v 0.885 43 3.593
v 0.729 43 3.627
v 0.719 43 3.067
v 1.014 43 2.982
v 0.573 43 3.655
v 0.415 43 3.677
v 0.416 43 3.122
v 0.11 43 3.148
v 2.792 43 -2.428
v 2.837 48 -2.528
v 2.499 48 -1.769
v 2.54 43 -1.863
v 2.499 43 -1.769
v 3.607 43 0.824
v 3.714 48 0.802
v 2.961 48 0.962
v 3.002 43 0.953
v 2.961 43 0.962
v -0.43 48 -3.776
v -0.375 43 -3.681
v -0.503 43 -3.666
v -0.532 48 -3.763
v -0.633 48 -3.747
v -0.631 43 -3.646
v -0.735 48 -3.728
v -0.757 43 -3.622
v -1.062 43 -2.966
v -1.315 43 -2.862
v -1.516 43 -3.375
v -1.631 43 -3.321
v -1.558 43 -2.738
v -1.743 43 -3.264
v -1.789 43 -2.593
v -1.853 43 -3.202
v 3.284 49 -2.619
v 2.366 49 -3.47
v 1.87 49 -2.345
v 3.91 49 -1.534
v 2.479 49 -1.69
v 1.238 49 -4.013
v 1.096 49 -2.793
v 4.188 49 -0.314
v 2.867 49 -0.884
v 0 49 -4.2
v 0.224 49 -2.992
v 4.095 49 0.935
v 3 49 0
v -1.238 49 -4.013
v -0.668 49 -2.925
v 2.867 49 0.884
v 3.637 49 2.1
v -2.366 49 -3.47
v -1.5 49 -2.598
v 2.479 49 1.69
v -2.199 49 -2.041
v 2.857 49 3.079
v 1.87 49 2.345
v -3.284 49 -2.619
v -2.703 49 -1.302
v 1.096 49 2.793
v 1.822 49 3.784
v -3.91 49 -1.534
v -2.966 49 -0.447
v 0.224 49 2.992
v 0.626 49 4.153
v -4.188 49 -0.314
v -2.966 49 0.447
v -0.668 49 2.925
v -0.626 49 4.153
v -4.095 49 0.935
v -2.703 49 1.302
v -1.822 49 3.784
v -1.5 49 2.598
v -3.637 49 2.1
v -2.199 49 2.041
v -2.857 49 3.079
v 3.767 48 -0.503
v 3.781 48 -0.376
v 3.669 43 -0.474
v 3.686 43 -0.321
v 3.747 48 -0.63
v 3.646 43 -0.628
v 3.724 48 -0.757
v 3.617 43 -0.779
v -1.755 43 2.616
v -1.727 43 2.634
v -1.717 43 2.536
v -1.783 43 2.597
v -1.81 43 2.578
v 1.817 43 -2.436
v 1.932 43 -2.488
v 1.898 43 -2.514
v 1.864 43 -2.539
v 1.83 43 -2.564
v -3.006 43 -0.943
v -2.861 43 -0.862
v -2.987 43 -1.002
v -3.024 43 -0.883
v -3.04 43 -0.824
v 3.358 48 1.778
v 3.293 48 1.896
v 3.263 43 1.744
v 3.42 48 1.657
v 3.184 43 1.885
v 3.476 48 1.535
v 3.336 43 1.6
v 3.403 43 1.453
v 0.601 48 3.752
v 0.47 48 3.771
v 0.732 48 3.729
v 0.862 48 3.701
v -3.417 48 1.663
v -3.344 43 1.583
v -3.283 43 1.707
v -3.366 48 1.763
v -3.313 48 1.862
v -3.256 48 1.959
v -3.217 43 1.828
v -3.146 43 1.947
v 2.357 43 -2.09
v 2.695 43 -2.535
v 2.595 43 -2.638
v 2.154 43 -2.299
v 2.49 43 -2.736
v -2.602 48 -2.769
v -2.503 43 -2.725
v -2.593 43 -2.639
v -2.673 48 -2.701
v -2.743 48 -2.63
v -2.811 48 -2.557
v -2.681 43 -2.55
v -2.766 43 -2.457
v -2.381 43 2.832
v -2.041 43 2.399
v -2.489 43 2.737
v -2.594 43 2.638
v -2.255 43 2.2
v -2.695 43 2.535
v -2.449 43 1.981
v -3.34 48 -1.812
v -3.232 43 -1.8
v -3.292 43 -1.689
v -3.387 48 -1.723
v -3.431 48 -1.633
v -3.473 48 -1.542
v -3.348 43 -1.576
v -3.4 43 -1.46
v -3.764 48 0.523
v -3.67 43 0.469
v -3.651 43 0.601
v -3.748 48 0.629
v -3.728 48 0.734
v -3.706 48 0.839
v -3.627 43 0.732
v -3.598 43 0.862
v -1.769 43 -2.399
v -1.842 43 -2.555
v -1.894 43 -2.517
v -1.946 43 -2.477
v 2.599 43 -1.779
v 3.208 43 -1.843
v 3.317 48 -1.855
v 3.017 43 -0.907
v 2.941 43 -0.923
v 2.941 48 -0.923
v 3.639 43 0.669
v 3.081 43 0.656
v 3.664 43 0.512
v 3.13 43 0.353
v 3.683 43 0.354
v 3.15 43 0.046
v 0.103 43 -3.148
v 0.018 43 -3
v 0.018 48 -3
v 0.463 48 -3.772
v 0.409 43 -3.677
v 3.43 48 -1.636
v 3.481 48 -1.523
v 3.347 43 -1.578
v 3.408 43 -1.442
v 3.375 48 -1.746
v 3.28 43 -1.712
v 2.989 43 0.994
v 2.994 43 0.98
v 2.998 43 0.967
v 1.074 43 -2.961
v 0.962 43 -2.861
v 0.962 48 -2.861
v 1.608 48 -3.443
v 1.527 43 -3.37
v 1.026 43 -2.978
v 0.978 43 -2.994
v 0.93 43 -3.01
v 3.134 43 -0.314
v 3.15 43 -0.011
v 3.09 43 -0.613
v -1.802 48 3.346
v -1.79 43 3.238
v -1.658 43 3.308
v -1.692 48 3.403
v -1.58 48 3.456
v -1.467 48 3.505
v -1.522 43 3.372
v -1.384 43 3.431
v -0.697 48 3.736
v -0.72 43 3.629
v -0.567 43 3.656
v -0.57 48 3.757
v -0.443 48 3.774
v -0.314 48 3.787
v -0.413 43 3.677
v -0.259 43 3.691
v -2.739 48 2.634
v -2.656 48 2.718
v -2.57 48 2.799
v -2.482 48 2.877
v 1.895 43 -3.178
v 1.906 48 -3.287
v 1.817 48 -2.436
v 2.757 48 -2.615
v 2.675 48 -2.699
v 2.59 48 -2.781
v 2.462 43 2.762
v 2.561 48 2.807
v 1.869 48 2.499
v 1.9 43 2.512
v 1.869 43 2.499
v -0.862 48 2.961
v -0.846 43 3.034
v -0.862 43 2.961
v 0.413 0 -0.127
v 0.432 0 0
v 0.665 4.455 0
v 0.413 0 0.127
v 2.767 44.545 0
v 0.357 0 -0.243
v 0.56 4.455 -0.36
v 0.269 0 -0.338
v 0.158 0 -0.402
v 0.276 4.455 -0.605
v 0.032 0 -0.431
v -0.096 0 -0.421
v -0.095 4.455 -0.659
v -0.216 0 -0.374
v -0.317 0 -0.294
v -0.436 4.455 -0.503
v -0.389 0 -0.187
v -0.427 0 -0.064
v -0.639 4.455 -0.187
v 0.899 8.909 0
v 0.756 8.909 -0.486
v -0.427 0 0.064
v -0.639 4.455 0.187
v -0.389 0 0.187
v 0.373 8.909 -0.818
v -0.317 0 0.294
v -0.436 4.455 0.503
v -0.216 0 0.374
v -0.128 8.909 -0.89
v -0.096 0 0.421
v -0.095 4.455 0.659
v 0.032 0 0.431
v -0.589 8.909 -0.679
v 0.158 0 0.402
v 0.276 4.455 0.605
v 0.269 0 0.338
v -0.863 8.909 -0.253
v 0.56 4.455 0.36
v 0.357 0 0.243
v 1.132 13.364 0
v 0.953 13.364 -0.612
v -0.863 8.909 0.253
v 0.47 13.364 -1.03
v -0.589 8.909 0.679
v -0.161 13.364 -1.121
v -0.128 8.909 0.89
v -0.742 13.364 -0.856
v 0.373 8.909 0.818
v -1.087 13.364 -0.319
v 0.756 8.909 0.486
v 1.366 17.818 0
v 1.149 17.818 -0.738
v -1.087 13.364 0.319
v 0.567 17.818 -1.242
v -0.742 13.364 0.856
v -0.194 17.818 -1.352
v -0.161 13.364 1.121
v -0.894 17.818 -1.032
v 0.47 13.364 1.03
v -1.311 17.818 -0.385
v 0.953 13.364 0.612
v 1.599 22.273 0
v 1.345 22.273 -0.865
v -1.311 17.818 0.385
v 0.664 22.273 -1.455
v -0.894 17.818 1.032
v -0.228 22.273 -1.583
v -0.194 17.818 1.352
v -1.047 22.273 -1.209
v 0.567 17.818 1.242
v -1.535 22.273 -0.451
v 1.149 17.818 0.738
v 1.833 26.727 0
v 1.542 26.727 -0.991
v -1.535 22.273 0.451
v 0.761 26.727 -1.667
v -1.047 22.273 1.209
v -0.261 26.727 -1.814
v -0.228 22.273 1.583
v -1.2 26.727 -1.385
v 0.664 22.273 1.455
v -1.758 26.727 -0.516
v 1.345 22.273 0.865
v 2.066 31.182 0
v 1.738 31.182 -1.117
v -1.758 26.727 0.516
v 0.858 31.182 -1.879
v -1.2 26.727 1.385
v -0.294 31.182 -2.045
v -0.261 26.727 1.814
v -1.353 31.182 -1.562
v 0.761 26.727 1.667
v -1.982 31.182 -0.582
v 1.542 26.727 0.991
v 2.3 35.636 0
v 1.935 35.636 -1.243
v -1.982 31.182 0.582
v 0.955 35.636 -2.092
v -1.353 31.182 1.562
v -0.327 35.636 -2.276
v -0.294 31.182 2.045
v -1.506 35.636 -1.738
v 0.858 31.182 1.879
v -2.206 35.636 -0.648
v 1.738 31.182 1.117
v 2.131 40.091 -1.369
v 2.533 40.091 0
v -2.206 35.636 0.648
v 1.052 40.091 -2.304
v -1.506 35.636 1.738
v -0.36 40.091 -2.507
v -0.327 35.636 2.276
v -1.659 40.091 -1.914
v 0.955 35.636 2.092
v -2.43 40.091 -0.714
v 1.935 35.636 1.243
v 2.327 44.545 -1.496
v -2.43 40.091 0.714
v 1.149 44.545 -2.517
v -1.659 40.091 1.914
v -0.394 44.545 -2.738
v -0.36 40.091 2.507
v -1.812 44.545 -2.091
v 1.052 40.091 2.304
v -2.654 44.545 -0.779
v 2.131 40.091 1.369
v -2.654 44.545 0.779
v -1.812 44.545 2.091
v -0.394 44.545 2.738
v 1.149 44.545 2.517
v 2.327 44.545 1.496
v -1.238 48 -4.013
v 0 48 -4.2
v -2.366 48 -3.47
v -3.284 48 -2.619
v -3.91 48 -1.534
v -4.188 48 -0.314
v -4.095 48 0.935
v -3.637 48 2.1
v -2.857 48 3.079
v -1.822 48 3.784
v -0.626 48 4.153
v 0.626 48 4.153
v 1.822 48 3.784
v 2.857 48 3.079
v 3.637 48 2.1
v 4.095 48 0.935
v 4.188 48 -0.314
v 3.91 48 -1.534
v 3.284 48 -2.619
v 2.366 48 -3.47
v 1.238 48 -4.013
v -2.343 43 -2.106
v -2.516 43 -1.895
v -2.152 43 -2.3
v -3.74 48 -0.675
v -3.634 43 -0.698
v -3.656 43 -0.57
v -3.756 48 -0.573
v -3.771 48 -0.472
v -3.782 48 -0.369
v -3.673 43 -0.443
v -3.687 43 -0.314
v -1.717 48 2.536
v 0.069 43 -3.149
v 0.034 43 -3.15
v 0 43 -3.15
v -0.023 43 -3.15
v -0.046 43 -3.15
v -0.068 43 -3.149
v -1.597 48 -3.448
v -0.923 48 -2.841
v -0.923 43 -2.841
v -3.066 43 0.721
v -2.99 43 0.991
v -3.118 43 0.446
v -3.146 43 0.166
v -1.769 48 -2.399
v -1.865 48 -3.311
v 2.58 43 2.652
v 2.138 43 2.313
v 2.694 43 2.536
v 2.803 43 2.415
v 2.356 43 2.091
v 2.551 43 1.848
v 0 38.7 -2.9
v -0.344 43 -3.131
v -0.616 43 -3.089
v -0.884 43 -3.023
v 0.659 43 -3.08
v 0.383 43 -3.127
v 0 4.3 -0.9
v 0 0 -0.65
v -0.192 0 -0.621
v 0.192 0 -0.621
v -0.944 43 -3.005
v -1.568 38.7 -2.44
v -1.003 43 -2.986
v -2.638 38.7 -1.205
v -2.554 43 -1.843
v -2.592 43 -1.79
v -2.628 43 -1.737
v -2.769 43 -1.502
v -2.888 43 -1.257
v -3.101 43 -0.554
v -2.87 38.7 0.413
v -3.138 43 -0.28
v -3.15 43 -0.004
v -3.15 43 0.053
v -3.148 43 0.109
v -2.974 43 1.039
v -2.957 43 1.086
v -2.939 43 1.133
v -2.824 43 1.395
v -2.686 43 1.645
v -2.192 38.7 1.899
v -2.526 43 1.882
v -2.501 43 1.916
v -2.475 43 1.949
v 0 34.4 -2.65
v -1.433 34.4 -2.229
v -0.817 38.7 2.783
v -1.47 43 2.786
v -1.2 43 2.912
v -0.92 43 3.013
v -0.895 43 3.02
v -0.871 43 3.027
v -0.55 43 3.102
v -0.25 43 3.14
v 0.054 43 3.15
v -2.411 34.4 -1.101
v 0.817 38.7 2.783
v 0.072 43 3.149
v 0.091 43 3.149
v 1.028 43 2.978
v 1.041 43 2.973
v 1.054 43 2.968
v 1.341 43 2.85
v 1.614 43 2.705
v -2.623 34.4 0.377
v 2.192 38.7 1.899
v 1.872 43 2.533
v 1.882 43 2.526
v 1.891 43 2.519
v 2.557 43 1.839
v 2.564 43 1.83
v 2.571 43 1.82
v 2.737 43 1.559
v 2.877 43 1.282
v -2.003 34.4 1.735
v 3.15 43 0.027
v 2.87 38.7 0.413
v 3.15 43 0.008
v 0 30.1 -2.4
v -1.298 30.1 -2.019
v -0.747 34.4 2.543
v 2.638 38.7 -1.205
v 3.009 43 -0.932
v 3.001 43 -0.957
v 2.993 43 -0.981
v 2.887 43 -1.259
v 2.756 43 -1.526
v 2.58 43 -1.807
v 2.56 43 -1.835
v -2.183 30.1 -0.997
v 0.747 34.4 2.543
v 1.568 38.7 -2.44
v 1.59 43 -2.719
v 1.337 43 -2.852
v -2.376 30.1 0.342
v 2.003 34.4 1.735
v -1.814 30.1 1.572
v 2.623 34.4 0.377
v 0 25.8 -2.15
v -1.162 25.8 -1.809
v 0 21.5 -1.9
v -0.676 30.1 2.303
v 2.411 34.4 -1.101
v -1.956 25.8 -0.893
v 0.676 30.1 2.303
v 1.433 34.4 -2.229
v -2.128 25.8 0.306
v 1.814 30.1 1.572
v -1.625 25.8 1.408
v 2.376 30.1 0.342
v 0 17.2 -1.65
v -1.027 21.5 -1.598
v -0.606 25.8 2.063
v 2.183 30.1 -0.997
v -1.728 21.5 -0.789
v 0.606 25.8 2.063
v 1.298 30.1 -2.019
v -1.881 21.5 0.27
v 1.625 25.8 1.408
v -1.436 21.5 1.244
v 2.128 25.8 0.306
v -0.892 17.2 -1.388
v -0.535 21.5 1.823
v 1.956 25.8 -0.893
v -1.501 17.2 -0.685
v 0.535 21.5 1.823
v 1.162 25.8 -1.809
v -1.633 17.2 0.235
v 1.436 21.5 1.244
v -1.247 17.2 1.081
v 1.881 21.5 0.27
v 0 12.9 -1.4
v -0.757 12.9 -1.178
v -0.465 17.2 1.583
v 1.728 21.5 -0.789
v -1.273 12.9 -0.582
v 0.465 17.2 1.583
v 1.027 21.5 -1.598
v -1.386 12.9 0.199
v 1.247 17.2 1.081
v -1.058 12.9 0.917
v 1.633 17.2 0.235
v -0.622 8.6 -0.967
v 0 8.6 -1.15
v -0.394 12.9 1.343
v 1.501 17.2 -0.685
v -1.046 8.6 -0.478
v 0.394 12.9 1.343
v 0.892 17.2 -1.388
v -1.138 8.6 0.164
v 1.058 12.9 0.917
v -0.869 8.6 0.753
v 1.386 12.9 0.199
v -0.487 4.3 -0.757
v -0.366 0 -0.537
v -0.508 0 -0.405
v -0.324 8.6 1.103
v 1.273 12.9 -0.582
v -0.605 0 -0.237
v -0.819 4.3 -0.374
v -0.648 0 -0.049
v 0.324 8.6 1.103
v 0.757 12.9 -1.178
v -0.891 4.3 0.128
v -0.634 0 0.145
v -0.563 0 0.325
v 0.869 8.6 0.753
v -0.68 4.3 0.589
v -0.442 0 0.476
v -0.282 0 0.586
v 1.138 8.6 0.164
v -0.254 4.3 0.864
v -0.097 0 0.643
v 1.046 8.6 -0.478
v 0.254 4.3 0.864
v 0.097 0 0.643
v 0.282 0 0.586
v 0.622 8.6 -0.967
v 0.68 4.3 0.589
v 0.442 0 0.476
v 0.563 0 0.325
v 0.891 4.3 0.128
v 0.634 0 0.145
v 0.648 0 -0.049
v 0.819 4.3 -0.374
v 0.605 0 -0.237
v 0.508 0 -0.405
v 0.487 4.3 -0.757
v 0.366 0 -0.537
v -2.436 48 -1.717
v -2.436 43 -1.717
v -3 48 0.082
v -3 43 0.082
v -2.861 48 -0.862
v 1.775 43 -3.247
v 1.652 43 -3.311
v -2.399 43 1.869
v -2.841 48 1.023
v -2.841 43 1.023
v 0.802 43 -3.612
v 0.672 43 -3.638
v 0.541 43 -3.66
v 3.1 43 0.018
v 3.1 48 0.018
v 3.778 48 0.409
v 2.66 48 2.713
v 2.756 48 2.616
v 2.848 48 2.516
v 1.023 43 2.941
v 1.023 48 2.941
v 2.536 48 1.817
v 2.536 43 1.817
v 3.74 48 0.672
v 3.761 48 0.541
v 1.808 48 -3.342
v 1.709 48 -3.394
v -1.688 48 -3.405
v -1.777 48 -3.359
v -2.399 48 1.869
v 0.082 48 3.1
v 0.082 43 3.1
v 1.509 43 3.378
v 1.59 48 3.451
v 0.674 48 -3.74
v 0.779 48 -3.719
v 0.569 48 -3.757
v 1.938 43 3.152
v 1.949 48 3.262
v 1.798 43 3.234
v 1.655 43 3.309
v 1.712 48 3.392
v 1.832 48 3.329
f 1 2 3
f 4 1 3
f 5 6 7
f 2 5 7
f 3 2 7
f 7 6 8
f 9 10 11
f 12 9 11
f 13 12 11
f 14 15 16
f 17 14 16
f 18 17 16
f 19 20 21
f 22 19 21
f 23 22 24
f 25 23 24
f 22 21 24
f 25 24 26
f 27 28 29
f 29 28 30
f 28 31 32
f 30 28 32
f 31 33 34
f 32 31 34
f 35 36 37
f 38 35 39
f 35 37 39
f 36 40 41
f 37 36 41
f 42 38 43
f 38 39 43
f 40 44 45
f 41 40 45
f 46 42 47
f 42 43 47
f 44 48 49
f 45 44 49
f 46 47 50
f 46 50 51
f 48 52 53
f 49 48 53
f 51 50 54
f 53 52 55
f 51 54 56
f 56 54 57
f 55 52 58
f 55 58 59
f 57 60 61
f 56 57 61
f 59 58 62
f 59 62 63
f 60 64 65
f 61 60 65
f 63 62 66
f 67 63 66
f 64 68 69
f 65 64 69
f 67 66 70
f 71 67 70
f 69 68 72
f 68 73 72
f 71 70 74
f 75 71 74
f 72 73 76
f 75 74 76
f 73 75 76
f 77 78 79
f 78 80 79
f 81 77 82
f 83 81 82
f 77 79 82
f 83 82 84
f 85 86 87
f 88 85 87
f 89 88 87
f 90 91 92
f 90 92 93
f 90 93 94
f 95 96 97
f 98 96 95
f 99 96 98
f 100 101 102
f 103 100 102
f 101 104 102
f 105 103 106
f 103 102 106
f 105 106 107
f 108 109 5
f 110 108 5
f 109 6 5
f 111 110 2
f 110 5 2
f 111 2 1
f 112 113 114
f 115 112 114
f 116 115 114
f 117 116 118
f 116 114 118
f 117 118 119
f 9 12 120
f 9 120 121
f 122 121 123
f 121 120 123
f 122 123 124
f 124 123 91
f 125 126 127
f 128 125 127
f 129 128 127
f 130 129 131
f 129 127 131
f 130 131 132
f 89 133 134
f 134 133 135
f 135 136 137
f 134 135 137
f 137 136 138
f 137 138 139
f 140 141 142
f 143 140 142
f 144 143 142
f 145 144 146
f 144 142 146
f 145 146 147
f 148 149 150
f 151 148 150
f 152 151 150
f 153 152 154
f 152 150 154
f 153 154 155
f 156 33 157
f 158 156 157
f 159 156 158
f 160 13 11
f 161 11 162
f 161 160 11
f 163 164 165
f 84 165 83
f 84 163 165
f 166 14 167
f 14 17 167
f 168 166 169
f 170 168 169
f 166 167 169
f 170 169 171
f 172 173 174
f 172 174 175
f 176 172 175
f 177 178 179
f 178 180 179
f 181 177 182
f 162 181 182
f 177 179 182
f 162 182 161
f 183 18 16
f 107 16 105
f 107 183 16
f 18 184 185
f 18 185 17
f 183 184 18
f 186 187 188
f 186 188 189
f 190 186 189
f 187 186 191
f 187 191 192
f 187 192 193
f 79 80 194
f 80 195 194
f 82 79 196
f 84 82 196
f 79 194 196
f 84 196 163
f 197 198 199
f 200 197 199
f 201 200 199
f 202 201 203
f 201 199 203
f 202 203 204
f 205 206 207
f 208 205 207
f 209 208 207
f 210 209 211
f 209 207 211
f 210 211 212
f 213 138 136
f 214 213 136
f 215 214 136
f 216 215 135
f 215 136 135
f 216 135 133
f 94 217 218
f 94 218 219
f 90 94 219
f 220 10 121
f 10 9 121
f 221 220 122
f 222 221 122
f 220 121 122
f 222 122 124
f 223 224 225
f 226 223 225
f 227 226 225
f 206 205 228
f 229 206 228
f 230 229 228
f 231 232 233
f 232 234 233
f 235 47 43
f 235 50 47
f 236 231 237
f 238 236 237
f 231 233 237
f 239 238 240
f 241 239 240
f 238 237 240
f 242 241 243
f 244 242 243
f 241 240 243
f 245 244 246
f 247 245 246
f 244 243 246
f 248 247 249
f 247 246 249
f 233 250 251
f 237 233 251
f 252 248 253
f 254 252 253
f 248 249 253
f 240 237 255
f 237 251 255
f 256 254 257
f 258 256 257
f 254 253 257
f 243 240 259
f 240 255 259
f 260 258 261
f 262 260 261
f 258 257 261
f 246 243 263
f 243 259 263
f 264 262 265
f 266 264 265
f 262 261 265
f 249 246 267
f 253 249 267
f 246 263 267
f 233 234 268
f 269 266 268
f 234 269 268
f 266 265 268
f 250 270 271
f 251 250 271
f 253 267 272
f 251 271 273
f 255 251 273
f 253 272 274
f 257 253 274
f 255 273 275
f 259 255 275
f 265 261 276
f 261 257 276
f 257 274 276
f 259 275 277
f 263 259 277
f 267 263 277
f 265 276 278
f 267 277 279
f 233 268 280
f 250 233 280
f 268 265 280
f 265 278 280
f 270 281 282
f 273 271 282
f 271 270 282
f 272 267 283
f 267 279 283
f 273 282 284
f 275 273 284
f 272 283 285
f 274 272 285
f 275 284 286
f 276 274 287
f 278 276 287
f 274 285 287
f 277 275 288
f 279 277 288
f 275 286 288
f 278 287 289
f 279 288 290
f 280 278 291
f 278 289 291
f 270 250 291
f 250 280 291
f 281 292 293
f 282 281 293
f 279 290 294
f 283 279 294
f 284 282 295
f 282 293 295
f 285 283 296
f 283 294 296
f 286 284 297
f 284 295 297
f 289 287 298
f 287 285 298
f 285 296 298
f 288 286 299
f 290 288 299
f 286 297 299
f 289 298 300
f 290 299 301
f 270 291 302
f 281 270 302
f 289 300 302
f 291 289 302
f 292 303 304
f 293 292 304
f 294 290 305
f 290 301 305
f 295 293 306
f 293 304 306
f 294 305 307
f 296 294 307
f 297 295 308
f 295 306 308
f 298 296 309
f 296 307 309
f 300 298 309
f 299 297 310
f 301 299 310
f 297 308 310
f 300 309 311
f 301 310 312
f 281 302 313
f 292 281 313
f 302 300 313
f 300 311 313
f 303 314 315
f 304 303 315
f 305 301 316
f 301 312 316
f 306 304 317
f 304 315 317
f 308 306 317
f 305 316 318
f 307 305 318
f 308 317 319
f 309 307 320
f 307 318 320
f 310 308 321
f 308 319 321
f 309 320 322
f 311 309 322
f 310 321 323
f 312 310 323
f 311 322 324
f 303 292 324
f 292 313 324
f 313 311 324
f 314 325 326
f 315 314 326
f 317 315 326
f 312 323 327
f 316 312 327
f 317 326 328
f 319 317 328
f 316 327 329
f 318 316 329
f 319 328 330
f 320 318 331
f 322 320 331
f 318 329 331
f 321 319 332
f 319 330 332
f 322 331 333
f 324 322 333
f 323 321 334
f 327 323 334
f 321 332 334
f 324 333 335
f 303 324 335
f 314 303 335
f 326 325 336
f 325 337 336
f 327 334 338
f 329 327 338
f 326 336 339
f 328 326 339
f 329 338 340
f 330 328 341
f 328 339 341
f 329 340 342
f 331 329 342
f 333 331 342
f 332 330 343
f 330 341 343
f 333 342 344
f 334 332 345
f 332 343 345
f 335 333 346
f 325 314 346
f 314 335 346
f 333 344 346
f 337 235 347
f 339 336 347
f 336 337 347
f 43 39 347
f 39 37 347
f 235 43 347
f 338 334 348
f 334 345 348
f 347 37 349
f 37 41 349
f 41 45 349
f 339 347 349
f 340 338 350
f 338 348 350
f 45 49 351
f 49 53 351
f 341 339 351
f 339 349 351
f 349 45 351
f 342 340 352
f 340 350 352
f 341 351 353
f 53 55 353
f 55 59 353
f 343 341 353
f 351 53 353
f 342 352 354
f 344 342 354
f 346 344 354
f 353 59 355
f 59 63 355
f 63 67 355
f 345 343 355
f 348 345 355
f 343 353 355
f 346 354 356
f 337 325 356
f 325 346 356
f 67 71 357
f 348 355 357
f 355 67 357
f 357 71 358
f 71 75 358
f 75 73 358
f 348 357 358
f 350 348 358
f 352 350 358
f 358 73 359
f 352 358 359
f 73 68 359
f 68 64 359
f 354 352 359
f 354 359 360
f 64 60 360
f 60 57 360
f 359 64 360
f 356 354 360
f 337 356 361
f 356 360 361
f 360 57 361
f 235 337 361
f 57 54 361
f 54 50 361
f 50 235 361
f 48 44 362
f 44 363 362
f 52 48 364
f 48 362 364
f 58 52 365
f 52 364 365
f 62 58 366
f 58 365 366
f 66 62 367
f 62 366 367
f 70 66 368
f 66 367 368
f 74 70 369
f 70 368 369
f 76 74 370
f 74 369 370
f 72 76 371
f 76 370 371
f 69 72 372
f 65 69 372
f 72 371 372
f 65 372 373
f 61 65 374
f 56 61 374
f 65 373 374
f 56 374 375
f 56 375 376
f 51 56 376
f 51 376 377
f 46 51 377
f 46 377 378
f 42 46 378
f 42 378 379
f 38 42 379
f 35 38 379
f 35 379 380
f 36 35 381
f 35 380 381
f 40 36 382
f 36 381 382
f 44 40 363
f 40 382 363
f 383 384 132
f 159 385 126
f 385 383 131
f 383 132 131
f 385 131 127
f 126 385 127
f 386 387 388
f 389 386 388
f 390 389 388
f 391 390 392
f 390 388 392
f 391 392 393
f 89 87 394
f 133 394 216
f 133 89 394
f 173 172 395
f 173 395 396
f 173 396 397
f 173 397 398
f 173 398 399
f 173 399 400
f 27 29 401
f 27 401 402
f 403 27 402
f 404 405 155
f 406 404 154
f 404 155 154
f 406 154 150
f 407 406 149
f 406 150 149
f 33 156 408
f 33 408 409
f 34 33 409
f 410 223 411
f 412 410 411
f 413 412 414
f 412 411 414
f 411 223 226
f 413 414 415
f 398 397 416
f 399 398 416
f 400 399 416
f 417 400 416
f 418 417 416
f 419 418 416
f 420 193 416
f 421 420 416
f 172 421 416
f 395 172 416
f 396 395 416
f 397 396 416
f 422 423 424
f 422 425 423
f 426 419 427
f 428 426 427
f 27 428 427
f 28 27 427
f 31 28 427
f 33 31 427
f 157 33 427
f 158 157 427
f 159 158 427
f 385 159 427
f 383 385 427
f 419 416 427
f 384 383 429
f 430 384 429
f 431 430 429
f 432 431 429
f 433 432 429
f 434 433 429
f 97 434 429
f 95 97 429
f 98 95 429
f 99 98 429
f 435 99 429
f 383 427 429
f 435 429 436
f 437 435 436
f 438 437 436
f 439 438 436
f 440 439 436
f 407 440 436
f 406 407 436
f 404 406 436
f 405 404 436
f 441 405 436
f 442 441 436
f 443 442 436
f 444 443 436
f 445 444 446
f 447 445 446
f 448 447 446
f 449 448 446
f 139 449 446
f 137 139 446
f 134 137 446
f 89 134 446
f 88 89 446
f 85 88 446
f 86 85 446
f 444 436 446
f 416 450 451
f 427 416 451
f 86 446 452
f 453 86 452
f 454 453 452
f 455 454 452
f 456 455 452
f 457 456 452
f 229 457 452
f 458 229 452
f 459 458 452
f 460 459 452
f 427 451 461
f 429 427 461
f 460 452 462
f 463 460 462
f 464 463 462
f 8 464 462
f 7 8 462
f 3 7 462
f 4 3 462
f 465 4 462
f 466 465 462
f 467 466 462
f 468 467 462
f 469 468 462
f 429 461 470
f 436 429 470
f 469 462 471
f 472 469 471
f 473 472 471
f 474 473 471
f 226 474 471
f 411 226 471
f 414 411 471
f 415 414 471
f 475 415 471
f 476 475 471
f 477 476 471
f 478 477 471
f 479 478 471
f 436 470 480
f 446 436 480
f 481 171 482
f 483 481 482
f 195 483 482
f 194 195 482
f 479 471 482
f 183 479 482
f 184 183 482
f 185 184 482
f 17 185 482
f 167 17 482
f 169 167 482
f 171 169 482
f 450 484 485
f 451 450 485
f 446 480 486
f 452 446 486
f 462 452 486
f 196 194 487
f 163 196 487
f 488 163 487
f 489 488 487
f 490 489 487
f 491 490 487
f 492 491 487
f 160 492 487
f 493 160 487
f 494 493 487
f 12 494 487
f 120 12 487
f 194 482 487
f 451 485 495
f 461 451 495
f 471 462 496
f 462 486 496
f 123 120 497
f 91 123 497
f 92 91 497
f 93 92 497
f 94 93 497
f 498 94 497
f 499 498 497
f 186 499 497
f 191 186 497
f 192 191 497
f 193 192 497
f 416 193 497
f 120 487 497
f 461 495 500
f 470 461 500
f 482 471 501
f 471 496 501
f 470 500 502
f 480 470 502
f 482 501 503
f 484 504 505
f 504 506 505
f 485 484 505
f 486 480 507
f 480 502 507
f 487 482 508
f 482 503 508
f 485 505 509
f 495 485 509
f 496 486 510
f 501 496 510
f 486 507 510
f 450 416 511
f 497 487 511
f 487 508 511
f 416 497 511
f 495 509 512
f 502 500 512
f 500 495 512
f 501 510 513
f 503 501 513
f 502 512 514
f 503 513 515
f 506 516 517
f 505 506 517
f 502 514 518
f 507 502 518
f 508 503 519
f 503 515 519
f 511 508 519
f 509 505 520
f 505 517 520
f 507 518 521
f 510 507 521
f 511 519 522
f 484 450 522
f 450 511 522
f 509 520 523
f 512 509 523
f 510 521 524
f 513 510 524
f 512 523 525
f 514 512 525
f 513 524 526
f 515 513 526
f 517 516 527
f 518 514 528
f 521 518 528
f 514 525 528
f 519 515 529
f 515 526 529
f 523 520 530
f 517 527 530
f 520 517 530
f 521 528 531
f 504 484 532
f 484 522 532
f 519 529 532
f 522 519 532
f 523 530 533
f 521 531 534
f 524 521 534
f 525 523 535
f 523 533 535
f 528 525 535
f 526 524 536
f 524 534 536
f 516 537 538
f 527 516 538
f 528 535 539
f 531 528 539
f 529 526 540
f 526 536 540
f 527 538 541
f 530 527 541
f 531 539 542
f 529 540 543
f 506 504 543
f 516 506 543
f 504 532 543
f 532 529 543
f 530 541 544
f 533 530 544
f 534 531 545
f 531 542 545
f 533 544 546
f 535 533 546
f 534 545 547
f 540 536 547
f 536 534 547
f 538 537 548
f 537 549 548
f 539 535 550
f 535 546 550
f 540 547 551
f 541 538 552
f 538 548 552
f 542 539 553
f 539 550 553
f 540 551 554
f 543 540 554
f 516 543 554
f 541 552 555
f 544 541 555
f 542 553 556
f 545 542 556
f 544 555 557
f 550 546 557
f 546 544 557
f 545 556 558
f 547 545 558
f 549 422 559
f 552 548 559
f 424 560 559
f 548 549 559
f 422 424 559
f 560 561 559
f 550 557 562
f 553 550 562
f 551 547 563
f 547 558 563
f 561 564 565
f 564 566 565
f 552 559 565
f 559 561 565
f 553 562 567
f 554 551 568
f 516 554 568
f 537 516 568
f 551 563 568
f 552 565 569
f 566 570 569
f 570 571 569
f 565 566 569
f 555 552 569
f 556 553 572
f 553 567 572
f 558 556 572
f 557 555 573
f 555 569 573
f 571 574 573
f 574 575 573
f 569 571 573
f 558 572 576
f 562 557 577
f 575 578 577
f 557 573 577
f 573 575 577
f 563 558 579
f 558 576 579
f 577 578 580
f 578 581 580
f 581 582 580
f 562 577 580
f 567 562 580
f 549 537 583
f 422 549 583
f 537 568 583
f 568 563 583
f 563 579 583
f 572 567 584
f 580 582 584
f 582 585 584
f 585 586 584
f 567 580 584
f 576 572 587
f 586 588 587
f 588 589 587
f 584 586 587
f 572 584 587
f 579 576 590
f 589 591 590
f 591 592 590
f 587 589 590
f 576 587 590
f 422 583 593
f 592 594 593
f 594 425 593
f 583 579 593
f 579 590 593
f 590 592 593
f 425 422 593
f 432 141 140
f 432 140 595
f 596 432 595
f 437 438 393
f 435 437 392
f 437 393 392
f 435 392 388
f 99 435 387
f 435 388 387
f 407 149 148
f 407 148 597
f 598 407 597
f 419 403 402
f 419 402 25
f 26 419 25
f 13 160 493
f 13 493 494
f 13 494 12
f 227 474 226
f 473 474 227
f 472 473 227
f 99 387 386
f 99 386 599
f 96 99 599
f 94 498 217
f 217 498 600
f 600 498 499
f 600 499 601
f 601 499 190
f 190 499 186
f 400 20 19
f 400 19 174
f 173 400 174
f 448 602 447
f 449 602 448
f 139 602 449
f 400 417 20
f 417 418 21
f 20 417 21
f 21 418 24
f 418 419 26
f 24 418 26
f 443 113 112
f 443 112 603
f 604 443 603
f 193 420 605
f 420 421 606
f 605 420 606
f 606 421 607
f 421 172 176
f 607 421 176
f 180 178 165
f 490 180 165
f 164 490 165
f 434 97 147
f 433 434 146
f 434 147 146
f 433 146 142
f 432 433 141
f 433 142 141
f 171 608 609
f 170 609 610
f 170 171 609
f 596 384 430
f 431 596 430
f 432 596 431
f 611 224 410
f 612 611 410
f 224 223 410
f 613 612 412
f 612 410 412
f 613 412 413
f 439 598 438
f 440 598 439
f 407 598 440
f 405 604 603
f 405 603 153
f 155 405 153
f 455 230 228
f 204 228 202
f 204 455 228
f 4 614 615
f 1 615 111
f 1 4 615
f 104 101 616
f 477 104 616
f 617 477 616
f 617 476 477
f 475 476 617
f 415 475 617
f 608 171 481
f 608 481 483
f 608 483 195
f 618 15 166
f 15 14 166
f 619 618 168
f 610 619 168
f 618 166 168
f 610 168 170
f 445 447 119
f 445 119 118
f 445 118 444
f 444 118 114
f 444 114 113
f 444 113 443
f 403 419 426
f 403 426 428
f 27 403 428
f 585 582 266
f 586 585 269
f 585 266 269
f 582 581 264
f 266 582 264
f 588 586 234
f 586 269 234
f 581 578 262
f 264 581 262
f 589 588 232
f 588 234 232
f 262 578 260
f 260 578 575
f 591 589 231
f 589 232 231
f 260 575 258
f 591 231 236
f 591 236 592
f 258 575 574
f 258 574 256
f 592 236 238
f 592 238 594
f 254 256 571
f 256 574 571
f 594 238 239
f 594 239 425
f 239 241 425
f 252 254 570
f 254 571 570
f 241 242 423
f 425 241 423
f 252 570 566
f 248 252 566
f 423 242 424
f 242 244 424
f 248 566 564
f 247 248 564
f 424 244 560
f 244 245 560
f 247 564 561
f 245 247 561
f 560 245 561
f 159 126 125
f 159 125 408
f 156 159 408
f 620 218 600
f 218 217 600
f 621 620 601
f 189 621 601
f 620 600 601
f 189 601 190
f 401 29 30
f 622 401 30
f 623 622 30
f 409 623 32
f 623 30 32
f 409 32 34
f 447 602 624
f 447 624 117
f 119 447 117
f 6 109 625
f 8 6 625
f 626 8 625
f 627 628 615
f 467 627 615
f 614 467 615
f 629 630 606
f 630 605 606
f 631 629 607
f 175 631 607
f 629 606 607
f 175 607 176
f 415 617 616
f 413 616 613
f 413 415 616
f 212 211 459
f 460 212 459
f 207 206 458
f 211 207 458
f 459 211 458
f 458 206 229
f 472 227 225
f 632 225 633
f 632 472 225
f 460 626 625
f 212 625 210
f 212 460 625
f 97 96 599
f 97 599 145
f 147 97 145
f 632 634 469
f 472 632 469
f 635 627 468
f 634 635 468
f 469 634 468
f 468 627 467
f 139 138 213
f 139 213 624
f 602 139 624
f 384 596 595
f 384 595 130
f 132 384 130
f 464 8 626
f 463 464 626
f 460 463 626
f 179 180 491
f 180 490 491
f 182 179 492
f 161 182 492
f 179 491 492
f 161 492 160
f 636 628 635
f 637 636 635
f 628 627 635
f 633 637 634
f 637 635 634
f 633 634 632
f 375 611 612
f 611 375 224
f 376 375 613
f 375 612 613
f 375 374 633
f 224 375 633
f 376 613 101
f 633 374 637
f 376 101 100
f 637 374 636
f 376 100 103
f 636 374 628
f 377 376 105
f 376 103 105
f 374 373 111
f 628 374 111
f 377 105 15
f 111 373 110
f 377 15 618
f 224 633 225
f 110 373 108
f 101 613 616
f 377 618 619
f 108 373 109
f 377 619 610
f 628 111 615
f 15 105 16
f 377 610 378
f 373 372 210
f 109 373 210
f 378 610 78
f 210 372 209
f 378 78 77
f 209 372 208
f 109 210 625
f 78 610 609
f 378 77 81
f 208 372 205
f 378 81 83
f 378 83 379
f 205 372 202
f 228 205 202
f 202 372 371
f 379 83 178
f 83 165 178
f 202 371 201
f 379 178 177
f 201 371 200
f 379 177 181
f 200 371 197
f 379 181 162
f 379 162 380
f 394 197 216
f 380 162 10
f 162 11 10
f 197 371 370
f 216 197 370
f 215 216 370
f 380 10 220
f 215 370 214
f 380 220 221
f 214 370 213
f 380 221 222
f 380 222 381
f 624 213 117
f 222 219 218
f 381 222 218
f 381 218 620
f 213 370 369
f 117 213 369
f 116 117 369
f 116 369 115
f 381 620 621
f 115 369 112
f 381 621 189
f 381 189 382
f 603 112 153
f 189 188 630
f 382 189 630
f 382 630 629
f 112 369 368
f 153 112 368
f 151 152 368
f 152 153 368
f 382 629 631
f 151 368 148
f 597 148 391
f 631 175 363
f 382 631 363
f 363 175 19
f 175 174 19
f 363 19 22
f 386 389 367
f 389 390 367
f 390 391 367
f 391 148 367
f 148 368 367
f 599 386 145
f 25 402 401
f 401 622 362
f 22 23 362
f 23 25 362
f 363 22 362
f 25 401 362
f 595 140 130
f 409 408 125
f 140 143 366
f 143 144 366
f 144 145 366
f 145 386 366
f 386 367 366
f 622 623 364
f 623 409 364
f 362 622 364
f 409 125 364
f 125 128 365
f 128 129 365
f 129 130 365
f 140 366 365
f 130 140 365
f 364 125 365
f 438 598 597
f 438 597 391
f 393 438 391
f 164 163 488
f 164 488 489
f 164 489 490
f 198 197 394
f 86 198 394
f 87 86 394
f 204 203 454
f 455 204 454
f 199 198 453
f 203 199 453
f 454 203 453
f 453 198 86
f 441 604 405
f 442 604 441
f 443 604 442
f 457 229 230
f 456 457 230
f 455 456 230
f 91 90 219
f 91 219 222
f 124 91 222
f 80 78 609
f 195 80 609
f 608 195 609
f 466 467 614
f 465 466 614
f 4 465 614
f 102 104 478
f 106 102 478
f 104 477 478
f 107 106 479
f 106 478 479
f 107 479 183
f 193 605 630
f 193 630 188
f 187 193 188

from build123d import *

# Parameters (mm, degrees)
IZIM2_R               = 3
KES_EKSTR_ZYON1_DEPTH = 49
KES_EKSTR_ZYON1_DRAFT = -3
KES_EKSTR_ZYON4_DEPTH = 5


with BuildPart() as part:
    # Çizim1 → Döndür1 (revolve)
    with BuildSketch(Plane.XY, mode=Mode.PRIVATE) as d_nd_r1_sk:
        Polygon((0, 0), (0, 49), (4.2, 49), (4.2, 48), (3.8, 48), (3.7, 43), (3.15, 43), (0.65, 0), align=None)
    revolve(d_nd_r1_sk.sketch.rotate(Axis((0, 0, 0), (0, 1, 0)), 90), axis=Axis((0, 0, 0), (0, 1, 0)))


with BuildPart() as kes_ekstr_zyon1_tool:
    # Çizim2 → Kes-Ekstrüzyon1 (with draft: the straight prism first)
    with BuildSketch(Plane(origin=(0, 49, 0), x_dir=(1, 0, 0), z_dir=(0, 1, 0))):
        Circle(IZIM2_R)
    extrude(amount=-KES_EKSTR_ZYON1_DEPTH)
    # Kes-Ekstrüzyon1: the draft: its side faces are tilted about the plane it starts from
    kes_ekstr_zyon1_sides = [kes_ekstr_zyon1_tool.faces().sort_by_distance(p)[0] for p in [
        (-3, 24.5, 0),
    ]]
    draft(kes_ekstr_zyon1_sides, Plane(origin=(0, 49, 0), x_dir=(1, 0, 0), z_dir=(0, 1, 0)), KES_EKSTR_ZYON1_DRAFT)


with BuildPart() as part_1:
    add(part.part)

    # Kes-Ekstrüzyon1: cut by kes_ekstr_zyon1_tool
    add(kes_ekstr_zyon1_tool.part, mode=Mode.SUBTRACT)

    # Çizim3 → Kes-Ekstrüzyon4 (cut)
    with BuildSketch(Plane.XZ.offset(-43)):
        Polygon((0.08224501, 3.1), (-0.41775499, 3.966025404), (0.58224501, 3.966025404), align=None)
        Polygon((0.815256969, 3.918905719), (1.766313485, 3.609888725), (1.02316866, 2.940758119), align=None)
        Polygon((1.973360244, 3.493070587), (2.782377238, 2.905285335), (1.868831781, 2.498548692), align=None)
        Polygon((2.943191617, 2.730203716), (3.53097687, 1.921186722), (2.536454974, 1.816658258), align=None)
        Polygon((3.629817237, 1.704979831), (3.938834232, 0.753923315), (2.960686631, 0.961835006), align=None)
        Polygon((3.966025404, 0.51775499), (3.966025404, -0.48224501), (3.1, 0.01775499), align=None)
        Polygon((3.918905719, -0.715256969), (3.609888725, -1.666313485), (2.940758119, -0.92316866), align=None)
        Polygon((3.493070587, -1.873360244), (2.905285335, -2.682377238), (2.498548692, -1.768831781), align=None)
        Polygon((2.730203716, -2.843191617), (1.921186722, -3.43097687), (1.816658258, -2.436454974), align=None)
        Polygon((1.704979831, -3.529817237), (0.753923315, -3.838834232), (0.961835006, -2.860686631), align=None)
        Polygon((0.51775499, -3.866025404), (-0.48224501, -3.866025404), (0.01775499, -3), align=None)
        Polygon((-0.715256969, -3.818905719), (-1.666313485, -3.509888725), (-0.92316866, -2.840758119), align=None)
        Polygon((-1.873360244, -3.393070587), (-2.682377238, -2.805285335), (-1.768831781, -2.398548692), align=None)
        Polygon((-2.843191617, -2.630203716), (-3.43097687, -1.821186722), (-2.436454974, -1.716658258), align=None)
        Polygon((-3.529817237, -1.604979831), (-3.838834232, -0.653923315), (-2.860686631, -0.861835006), align=None)
        Polygon((-3.866025404, -0.41775499), (-3.866025404, 0.58224501), (-3, 0.08224501), align=None)
        Polygon((-3.818905719, 0.815256969), (-3.509888725, 1.766313485), (-2.840758119, 1.02316866), align=None)
        Polygon((-3.393070587, 1.973360244), (-2.805285335, 2.782377238), (-2.398548692, 1.868831781), align=None)
        Polygon((-2.630203716, 2.943191617), (-1.821186722, 3.53097687), (-1.716658258, 2.536454974), align=None)
        Polygon((-1.604979831, 3.629817237), (-0.653923315, 3.938834232), (-0.861835006, 2.960686631), align=None)
    extrude(amount=-KES_EKSTR_ZYON4_DEPTH, mode=Mode.SUBTRACT)


solid = part_1.part
